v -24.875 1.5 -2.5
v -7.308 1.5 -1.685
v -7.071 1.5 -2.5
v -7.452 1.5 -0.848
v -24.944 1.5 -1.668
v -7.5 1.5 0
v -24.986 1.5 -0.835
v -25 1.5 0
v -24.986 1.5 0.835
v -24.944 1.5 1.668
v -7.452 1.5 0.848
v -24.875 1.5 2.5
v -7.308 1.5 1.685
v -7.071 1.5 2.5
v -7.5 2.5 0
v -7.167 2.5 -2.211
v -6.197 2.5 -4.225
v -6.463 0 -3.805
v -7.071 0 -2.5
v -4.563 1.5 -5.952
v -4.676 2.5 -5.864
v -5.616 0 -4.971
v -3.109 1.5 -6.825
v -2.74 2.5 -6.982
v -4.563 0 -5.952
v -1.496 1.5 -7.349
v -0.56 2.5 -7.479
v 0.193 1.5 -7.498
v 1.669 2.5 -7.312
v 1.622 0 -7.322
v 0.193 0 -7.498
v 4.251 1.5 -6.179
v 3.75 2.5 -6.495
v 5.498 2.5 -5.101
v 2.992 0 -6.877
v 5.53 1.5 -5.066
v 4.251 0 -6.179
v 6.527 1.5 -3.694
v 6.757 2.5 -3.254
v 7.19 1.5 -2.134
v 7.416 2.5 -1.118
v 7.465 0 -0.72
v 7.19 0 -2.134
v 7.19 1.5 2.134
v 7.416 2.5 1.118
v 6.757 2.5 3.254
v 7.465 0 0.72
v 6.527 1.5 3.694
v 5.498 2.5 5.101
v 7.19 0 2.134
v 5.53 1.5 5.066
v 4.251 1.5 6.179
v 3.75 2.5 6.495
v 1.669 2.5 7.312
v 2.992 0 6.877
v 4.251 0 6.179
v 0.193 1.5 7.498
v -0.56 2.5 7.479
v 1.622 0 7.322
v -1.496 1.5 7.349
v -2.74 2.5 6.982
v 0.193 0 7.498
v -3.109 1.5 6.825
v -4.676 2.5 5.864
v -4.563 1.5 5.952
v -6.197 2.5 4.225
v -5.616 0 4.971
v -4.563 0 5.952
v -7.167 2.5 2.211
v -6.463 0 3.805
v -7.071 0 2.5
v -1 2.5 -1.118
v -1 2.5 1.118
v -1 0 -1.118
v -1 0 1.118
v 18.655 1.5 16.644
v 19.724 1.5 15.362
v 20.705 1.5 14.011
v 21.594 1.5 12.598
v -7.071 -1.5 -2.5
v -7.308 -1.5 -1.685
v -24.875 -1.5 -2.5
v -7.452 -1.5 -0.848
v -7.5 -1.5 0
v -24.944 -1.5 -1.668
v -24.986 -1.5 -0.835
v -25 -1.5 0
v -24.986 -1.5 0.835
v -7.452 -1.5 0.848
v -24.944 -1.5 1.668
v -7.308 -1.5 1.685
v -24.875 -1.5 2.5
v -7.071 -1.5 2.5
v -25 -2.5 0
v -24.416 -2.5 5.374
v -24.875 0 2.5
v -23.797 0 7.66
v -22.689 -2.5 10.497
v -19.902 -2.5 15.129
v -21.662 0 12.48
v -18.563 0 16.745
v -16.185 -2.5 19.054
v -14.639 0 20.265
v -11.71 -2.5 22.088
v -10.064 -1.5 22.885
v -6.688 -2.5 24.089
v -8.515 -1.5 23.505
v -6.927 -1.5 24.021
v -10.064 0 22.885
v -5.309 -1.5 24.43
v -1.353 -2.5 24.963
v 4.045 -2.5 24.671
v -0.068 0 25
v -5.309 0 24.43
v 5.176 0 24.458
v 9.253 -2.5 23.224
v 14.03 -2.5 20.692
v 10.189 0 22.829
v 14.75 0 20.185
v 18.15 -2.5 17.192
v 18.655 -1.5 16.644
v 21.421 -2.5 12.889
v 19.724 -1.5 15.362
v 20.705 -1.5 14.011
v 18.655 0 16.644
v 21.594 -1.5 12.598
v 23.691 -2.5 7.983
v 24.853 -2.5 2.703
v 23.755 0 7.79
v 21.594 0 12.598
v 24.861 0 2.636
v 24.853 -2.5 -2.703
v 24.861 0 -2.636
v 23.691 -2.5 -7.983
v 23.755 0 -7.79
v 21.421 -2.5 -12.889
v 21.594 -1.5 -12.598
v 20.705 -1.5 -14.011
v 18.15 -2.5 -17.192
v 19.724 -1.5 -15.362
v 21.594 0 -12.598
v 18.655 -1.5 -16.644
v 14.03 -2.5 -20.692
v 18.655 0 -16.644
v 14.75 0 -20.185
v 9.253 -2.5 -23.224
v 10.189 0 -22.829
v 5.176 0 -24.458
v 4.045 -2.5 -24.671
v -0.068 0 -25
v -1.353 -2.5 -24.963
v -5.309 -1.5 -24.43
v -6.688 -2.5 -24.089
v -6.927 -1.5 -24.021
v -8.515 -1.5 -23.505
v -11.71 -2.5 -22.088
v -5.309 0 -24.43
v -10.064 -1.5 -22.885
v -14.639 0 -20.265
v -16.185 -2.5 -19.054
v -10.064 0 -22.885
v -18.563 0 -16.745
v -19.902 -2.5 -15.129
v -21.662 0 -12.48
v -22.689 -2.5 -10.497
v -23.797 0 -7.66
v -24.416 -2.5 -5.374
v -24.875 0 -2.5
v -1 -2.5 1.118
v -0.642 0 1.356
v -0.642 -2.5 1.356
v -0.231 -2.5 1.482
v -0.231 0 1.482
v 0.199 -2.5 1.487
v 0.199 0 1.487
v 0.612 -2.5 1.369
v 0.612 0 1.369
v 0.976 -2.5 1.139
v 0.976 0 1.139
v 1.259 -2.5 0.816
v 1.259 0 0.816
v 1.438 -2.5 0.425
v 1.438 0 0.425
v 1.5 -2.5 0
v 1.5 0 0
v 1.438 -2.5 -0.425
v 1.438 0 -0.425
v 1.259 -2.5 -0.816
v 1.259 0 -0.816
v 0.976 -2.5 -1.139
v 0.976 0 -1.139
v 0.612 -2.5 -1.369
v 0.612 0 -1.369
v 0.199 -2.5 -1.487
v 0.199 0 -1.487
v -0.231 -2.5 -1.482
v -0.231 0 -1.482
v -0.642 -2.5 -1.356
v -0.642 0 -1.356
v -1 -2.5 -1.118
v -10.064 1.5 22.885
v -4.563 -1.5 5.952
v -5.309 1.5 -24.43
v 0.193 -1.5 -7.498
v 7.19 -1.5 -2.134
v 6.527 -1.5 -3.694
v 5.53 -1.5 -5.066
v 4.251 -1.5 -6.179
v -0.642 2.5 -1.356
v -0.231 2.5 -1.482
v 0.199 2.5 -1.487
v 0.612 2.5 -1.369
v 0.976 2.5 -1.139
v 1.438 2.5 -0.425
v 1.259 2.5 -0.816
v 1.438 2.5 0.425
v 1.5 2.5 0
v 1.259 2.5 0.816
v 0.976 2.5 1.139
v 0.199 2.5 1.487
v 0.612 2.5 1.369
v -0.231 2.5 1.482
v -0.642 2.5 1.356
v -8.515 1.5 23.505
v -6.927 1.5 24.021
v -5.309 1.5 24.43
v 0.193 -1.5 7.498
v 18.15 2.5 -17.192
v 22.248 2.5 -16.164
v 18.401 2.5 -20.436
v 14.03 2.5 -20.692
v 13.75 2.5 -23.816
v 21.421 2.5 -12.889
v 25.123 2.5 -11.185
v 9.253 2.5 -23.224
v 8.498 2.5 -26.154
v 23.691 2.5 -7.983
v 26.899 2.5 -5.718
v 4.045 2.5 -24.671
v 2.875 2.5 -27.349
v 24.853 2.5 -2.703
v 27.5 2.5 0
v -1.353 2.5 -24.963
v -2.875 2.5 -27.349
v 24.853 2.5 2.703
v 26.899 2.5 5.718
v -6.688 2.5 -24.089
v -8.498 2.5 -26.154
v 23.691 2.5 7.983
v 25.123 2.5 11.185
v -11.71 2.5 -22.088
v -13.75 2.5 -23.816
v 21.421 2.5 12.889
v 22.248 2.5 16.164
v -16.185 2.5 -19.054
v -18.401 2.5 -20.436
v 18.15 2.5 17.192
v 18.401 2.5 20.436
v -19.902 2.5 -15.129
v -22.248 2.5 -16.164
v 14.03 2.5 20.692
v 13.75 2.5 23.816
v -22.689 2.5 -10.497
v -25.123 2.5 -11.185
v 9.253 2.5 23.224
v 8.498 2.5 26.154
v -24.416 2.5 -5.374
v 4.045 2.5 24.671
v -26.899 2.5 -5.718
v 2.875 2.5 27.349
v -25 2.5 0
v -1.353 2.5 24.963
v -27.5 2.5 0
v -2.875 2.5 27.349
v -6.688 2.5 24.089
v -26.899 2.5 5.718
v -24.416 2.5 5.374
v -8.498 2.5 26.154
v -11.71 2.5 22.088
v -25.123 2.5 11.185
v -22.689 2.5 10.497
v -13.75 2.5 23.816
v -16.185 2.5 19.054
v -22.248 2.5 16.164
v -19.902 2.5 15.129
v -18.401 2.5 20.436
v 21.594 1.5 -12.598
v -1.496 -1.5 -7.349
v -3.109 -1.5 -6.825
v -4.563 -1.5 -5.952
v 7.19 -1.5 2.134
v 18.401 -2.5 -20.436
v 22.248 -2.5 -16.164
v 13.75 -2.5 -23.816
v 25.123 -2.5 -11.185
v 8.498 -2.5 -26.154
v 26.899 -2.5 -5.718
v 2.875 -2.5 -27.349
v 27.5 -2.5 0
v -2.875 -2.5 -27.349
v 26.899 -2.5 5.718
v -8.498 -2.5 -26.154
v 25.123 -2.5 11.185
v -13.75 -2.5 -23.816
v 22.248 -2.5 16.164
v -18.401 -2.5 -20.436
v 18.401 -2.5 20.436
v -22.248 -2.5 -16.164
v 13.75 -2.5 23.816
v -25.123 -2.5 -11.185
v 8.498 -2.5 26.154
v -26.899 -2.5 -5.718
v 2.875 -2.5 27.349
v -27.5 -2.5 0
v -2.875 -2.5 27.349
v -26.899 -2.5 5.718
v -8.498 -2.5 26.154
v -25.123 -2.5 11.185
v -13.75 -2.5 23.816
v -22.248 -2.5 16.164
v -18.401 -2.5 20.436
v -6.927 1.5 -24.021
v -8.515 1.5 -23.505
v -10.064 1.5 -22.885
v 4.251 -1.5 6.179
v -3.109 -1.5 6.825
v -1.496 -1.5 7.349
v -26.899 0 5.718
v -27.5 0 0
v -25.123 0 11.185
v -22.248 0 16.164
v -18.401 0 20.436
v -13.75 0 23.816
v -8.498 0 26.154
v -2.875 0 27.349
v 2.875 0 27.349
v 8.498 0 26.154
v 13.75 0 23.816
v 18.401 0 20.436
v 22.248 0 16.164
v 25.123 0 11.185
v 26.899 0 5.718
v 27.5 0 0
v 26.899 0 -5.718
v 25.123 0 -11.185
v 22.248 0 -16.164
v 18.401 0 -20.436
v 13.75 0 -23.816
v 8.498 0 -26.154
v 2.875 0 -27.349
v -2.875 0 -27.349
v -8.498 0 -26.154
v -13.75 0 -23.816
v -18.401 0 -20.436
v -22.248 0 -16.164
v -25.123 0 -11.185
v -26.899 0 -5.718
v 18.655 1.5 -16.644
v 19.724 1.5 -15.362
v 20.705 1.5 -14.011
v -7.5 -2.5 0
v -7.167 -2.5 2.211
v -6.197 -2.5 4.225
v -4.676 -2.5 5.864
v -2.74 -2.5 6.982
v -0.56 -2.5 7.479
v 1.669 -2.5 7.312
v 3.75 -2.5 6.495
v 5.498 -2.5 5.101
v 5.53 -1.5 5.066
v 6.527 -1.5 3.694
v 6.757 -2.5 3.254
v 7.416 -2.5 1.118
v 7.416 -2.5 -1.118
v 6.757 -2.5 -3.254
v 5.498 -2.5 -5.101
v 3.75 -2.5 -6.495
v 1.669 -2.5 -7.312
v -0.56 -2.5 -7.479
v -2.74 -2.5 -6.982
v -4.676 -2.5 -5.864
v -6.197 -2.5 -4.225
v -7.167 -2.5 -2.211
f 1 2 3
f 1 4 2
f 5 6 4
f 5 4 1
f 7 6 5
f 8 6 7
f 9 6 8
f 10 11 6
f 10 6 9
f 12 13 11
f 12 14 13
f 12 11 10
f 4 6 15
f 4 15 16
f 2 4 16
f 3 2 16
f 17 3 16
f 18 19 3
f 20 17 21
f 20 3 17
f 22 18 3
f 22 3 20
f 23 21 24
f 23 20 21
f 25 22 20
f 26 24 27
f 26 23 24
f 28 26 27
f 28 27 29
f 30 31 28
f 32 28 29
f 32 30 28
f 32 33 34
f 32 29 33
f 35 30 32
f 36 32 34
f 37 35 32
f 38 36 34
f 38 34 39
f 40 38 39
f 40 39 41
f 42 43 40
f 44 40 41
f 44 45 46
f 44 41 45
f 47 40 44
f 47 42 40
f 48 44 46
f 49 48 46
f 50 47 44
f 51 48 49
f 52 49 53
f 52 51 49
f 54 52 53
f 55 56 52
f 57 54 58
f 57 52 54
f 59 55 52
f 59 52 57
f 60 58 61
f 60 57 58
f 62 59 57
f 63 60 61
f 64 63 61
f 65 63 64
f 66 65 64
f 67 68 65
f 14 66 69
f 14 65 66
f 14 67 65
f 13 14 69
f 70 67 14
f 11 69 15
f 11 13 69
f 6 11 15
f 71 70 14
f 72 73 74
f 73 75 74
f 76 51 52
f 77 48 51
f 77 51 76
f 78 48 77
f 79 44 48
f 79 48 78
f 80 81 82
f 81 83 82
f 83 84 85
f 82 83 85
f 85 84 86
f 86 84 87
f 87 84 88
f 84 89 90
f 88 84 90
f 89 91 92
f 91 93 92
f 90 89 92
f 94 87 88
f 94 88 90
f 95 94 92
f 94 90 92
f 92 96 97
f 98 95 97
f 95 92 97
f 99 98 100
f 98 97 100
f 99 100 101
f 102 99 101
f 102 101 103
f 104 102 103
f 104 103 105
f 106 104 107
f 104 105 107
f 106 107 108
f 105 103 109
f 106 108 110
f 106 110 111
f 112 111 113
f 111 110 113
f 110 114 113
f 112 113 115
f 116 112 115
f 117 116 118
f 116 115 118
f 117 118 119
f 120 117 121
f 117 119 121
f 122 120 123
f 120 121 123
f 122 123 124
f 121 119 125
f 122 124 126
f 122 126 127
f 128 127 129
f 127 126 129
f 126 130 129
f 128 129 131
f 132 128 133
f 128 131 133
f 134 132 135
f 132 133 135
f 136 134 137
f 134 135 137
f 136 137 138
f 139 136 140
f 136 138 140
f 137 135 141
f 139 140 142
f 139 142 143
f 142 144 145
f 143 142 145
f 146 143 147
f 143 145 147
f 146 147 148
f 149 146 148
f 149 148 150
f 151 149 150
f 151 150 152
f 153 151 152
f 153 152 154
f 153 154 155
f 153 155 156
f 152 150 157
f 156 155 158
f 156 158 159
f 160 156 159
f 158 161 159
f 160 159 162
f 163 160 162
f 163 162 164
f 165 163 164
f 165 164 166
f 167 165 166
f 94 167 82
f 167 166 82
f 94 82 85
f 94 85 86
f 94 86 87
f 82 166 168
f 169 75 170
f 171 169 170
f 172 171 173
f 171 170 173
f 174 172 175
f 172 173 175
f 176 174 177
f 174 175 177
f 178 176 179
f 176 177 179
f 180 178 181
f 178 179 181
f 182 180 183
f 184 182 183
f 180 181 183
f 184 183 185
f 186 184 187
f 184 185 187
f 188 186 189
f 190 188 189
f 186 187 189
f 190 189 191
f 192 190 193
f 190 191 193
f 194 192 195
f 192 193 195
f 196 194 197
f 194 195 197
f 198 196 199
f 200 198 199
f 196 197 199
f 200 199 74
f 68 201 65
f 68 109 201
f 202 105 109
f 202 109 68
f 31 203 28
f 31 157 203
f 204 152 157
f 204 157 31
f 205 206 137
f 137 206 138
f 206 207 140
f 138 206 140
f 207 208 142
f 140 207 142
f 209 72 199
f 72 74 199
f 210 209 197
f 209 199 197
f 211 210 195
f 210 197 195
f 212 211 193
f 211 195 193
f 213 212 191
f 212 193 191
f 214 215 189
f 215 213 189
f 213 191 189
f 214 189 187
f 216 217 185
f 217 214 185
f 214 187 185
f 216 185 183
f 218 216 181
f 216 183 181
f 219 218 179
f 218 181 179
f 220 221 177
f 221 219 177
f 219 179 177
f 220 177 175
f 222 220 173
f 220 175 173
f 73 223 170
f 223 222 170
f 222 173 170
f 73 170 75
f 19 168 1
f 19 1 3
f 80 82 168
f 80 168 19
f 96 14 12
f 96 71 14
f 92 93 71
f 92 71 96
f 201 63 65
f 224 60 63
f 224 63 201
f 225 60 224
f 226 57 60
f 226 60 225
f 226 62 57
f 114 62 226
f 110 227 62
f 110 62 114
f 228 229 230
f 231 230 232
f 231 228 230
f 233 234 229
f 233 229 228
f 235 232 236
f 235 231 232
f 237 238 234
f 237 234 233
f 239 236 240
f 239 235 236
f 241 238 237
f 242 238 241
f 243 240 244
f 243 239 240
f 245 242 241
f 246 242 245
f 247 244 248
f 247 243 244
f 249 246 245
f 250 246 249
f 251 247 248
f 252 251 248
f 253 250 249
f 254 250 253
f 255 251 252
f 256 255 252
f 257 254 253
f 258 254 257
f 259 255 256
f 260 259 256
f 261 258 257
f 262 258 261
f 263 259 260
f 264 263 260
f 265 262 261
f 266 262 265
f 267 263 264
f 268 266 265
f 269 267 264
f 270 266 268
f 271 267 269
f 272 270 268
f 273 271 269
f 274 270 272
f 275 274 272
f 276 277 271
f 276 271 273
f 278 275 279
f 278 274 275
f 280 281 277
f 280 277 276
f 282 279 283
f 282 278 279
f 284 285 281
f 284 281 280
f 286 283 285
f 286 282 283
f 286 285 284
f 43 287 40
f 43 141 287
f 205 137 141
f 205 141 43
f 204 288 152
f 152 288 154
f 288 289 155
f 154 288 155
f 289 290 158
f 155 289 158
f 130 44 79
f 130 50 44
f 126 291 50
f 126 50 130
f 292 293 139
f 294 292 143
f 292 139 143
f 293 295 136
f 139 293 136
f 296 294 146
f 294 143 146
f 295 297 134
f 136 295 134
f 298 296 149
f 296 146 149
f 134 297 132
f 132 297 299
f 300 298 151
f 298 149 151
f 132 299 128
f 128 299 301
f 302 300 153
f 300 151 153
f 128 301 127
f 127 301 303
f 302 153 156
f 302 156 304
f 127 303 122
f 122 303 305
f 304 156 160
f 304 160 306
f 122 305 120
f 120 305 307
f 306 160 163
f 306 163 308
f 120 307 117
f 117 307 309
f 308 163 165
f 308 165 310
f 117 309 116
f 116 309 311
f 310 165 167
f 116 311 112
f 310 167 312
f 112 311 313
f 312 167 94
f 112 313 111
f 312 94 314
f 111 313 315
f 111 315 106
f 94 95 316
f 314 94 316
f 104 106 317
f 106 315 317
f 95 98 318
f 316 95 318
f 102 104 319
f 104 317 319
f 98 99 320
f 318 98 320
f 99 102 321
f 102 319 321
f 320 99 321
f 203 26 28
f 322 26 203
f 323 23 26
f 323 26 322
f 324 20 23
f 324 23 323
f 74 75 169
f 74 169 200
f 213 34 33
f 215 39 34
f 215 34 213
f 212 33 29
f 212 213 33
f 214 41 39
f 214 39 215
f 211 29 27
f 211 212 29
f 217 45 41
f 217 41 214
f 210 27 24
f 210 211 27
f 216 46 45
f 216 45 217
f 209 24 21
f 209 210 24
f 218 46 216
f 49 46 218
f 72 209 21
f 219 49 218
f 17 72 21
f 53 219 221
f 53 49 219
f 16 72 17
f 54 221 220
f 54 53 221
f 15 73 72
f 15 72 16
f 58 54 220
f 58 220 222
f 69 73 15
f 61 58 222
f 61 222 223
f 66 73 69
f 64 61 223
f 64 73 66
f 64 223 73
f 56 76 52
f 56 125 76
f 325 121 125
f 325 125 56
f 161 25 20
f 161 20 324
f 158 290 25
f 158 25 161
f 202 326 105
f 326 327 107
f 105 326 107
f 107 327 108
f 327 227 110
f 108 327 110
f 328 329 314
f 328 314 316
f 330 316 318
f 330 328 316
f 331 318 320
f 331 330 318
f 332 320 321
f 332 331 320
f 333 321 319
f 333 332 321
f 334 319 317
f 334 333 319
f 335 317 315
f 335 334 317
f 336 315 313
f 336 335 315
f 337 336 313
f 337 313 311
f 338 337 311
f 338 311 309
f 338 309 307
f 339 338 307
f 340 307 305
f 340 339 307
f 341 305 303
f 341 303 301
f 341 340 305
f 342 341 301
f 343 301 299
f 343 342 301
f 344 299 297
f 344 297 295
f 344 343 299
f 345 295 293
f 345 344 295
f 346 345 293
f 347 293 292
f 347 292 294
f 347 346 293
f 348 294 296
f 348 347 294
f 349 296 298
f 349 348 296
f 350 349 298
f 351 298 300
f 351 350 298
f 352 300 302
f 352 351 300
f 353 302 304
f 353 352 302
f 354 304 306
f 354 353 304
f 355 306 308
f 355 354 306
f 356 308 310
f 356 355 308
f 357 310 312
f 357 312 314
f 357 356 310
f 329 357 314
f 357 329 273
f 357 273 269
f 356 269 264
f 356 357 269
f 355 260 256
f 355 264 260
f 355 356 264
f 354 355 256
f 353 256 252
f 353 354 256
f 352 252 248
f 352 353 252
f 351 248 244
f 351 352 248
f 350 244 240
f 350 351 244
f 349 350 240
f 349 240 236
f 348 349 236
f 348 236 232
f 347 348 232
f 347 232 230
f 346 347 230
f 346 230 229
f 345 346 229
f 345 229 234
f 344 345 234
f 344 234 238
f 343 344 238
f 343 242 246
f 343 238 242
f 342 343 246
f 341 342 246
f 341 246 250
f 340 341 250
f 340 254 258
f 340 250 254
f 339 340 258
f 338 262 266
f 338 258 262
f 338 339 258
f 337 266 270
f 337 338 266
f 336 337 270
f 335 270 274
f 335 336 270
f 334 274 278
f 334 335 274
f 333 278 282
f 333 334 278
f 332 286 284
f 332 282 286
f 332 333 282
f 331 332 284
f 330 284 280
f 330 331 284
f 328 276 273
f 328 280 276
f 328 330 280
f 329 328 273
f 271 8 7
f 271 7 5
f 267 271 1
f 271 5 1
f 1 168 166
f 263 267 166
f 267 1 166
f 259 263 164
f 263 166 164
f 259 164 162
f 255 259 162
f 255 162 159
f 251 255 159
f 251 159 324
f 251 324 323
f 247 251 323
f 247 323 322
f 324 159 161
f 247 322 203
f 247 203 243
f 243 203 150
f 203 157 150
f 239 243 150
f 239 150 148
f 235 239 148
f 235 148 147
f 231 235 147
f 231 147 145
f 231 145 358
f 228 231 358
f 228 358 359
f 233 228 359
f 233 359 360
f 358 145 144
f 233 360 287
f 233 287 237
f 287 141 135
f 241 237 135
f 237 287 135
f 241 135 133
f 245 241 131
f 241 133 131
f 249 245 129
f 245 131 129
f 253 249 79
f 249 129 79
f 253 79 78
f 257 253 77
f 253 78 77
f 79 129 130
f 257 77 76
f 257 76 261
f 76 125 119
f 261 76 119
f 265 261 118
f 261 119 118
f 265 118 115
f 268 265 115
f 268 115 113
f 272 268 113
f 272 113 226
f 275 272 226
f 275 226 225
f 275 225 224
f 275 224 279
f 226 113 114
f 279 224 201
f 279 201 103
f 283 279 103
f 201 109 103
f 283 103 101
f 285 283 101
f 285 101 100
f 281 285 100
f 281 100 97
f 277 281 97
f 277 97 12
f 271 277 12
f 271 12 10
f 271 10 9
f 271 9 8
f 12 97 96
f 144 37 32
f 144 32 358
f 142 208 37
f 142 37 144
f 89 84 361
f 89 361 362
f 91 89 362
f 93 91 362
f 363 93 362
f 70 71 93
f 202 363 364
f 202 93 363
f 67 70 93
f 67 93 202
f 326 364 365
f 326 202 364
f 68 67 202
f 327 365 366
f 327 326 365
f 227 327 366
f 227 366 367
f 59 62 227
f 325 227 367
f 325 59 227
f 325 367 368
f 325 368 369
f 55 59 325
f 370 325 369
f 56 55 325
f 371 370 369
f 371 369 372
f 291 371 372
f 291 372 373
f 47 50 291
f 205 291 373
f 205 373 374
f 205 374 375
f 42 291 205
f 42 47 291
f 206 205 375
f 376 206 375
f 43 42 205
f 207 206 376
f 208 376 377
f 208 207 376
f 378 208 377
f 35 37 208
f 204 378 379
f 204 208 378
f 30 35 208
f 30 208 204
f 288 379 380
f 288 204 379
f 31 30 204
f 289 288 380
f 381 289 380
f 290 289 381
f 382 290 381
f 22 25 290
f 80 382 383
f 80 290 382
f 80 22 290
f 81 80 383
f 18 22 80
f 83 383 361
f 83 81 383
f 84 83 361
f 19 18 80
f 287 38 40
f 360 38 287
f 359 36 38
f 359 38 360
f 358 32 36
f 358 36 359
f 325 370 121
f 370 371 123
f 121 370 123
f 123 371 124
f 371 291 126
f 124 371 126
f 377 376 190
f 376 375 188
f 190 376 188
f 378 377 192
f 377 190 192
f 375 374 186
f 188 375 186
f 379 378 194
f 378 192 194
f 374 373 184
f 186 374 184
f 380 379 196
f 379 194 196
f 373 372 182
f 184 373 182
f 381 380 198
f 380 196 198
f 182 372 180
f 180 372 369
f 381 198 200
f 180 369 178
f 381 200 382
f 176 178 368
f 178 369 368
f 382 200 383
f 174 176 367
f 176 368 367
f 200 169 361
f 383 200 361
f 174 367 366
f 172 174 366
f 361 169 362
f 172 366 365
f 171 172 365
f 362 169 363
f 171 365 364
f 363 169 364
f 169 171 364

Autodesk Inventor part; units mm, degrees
ref_plane "YZ Plane" through (0, 0, 0) normal (1, 0, 0) x (0, 1, 0)
ref_plane "XZ Plane" through (0, 0, 0) normal (0, 1, 0) x (-1, 0, 0)
ref_plane "XY Plane" through (0, 0, 0) normal (0, 0, 1) x (1, 0, 0)
sketch "Boceto1" plane through (0, 0, 0) normal (0, 1, 0) x (-1, 0, 0)
  circle A0 centre (0, 0) radius 27.5
  circle A1 centre (0, 0) radius 25
  circle A2 centre (0, 0) radius 7.5
  arc A3 (1, 1.118) -> (1, -1.118) centre (0, 0) ccw
  line L0 (1, 1.118) -> (1, -1.118)
  dimension "d0" = 55
  dimension "d1" = 50
  dimension "d2" = 15
  dimension "d3" = 3
  dimension "d6" = 1
extrude "Extrusión1" add sketch "Boceto1" along normal mid plane 5
sketch "Boceto2" plane through (0, 0, 0) normal (0, 1, 0) x (-1, 0, 0)
  arc A0 (7.0711, -2.5) -> (7.0711, 2.5) centre (0, 0) ccw
  arc A1 (24.8747, -2.5) -> (24.8747, 2.5) centre (0, 0) ccw
  line L0 (7.0711, 2.5) -> (24.8747, 2.5)
  line L1 (24.8747, -2.5) -> (7.0711, -2.5)
  dimension "d9" = 15
  dimension "d10" = 50
  dimension "d12" = 2.5
extrude "Extrusión2" add sketch "Boceto2" along normal mid plane 3
pattern_circular "Patrón circular1" count 5 over 360 about axis through (0, -10, 0) along (0, 1, 0) of "Extrusión2"
properties part number "Rueda"
